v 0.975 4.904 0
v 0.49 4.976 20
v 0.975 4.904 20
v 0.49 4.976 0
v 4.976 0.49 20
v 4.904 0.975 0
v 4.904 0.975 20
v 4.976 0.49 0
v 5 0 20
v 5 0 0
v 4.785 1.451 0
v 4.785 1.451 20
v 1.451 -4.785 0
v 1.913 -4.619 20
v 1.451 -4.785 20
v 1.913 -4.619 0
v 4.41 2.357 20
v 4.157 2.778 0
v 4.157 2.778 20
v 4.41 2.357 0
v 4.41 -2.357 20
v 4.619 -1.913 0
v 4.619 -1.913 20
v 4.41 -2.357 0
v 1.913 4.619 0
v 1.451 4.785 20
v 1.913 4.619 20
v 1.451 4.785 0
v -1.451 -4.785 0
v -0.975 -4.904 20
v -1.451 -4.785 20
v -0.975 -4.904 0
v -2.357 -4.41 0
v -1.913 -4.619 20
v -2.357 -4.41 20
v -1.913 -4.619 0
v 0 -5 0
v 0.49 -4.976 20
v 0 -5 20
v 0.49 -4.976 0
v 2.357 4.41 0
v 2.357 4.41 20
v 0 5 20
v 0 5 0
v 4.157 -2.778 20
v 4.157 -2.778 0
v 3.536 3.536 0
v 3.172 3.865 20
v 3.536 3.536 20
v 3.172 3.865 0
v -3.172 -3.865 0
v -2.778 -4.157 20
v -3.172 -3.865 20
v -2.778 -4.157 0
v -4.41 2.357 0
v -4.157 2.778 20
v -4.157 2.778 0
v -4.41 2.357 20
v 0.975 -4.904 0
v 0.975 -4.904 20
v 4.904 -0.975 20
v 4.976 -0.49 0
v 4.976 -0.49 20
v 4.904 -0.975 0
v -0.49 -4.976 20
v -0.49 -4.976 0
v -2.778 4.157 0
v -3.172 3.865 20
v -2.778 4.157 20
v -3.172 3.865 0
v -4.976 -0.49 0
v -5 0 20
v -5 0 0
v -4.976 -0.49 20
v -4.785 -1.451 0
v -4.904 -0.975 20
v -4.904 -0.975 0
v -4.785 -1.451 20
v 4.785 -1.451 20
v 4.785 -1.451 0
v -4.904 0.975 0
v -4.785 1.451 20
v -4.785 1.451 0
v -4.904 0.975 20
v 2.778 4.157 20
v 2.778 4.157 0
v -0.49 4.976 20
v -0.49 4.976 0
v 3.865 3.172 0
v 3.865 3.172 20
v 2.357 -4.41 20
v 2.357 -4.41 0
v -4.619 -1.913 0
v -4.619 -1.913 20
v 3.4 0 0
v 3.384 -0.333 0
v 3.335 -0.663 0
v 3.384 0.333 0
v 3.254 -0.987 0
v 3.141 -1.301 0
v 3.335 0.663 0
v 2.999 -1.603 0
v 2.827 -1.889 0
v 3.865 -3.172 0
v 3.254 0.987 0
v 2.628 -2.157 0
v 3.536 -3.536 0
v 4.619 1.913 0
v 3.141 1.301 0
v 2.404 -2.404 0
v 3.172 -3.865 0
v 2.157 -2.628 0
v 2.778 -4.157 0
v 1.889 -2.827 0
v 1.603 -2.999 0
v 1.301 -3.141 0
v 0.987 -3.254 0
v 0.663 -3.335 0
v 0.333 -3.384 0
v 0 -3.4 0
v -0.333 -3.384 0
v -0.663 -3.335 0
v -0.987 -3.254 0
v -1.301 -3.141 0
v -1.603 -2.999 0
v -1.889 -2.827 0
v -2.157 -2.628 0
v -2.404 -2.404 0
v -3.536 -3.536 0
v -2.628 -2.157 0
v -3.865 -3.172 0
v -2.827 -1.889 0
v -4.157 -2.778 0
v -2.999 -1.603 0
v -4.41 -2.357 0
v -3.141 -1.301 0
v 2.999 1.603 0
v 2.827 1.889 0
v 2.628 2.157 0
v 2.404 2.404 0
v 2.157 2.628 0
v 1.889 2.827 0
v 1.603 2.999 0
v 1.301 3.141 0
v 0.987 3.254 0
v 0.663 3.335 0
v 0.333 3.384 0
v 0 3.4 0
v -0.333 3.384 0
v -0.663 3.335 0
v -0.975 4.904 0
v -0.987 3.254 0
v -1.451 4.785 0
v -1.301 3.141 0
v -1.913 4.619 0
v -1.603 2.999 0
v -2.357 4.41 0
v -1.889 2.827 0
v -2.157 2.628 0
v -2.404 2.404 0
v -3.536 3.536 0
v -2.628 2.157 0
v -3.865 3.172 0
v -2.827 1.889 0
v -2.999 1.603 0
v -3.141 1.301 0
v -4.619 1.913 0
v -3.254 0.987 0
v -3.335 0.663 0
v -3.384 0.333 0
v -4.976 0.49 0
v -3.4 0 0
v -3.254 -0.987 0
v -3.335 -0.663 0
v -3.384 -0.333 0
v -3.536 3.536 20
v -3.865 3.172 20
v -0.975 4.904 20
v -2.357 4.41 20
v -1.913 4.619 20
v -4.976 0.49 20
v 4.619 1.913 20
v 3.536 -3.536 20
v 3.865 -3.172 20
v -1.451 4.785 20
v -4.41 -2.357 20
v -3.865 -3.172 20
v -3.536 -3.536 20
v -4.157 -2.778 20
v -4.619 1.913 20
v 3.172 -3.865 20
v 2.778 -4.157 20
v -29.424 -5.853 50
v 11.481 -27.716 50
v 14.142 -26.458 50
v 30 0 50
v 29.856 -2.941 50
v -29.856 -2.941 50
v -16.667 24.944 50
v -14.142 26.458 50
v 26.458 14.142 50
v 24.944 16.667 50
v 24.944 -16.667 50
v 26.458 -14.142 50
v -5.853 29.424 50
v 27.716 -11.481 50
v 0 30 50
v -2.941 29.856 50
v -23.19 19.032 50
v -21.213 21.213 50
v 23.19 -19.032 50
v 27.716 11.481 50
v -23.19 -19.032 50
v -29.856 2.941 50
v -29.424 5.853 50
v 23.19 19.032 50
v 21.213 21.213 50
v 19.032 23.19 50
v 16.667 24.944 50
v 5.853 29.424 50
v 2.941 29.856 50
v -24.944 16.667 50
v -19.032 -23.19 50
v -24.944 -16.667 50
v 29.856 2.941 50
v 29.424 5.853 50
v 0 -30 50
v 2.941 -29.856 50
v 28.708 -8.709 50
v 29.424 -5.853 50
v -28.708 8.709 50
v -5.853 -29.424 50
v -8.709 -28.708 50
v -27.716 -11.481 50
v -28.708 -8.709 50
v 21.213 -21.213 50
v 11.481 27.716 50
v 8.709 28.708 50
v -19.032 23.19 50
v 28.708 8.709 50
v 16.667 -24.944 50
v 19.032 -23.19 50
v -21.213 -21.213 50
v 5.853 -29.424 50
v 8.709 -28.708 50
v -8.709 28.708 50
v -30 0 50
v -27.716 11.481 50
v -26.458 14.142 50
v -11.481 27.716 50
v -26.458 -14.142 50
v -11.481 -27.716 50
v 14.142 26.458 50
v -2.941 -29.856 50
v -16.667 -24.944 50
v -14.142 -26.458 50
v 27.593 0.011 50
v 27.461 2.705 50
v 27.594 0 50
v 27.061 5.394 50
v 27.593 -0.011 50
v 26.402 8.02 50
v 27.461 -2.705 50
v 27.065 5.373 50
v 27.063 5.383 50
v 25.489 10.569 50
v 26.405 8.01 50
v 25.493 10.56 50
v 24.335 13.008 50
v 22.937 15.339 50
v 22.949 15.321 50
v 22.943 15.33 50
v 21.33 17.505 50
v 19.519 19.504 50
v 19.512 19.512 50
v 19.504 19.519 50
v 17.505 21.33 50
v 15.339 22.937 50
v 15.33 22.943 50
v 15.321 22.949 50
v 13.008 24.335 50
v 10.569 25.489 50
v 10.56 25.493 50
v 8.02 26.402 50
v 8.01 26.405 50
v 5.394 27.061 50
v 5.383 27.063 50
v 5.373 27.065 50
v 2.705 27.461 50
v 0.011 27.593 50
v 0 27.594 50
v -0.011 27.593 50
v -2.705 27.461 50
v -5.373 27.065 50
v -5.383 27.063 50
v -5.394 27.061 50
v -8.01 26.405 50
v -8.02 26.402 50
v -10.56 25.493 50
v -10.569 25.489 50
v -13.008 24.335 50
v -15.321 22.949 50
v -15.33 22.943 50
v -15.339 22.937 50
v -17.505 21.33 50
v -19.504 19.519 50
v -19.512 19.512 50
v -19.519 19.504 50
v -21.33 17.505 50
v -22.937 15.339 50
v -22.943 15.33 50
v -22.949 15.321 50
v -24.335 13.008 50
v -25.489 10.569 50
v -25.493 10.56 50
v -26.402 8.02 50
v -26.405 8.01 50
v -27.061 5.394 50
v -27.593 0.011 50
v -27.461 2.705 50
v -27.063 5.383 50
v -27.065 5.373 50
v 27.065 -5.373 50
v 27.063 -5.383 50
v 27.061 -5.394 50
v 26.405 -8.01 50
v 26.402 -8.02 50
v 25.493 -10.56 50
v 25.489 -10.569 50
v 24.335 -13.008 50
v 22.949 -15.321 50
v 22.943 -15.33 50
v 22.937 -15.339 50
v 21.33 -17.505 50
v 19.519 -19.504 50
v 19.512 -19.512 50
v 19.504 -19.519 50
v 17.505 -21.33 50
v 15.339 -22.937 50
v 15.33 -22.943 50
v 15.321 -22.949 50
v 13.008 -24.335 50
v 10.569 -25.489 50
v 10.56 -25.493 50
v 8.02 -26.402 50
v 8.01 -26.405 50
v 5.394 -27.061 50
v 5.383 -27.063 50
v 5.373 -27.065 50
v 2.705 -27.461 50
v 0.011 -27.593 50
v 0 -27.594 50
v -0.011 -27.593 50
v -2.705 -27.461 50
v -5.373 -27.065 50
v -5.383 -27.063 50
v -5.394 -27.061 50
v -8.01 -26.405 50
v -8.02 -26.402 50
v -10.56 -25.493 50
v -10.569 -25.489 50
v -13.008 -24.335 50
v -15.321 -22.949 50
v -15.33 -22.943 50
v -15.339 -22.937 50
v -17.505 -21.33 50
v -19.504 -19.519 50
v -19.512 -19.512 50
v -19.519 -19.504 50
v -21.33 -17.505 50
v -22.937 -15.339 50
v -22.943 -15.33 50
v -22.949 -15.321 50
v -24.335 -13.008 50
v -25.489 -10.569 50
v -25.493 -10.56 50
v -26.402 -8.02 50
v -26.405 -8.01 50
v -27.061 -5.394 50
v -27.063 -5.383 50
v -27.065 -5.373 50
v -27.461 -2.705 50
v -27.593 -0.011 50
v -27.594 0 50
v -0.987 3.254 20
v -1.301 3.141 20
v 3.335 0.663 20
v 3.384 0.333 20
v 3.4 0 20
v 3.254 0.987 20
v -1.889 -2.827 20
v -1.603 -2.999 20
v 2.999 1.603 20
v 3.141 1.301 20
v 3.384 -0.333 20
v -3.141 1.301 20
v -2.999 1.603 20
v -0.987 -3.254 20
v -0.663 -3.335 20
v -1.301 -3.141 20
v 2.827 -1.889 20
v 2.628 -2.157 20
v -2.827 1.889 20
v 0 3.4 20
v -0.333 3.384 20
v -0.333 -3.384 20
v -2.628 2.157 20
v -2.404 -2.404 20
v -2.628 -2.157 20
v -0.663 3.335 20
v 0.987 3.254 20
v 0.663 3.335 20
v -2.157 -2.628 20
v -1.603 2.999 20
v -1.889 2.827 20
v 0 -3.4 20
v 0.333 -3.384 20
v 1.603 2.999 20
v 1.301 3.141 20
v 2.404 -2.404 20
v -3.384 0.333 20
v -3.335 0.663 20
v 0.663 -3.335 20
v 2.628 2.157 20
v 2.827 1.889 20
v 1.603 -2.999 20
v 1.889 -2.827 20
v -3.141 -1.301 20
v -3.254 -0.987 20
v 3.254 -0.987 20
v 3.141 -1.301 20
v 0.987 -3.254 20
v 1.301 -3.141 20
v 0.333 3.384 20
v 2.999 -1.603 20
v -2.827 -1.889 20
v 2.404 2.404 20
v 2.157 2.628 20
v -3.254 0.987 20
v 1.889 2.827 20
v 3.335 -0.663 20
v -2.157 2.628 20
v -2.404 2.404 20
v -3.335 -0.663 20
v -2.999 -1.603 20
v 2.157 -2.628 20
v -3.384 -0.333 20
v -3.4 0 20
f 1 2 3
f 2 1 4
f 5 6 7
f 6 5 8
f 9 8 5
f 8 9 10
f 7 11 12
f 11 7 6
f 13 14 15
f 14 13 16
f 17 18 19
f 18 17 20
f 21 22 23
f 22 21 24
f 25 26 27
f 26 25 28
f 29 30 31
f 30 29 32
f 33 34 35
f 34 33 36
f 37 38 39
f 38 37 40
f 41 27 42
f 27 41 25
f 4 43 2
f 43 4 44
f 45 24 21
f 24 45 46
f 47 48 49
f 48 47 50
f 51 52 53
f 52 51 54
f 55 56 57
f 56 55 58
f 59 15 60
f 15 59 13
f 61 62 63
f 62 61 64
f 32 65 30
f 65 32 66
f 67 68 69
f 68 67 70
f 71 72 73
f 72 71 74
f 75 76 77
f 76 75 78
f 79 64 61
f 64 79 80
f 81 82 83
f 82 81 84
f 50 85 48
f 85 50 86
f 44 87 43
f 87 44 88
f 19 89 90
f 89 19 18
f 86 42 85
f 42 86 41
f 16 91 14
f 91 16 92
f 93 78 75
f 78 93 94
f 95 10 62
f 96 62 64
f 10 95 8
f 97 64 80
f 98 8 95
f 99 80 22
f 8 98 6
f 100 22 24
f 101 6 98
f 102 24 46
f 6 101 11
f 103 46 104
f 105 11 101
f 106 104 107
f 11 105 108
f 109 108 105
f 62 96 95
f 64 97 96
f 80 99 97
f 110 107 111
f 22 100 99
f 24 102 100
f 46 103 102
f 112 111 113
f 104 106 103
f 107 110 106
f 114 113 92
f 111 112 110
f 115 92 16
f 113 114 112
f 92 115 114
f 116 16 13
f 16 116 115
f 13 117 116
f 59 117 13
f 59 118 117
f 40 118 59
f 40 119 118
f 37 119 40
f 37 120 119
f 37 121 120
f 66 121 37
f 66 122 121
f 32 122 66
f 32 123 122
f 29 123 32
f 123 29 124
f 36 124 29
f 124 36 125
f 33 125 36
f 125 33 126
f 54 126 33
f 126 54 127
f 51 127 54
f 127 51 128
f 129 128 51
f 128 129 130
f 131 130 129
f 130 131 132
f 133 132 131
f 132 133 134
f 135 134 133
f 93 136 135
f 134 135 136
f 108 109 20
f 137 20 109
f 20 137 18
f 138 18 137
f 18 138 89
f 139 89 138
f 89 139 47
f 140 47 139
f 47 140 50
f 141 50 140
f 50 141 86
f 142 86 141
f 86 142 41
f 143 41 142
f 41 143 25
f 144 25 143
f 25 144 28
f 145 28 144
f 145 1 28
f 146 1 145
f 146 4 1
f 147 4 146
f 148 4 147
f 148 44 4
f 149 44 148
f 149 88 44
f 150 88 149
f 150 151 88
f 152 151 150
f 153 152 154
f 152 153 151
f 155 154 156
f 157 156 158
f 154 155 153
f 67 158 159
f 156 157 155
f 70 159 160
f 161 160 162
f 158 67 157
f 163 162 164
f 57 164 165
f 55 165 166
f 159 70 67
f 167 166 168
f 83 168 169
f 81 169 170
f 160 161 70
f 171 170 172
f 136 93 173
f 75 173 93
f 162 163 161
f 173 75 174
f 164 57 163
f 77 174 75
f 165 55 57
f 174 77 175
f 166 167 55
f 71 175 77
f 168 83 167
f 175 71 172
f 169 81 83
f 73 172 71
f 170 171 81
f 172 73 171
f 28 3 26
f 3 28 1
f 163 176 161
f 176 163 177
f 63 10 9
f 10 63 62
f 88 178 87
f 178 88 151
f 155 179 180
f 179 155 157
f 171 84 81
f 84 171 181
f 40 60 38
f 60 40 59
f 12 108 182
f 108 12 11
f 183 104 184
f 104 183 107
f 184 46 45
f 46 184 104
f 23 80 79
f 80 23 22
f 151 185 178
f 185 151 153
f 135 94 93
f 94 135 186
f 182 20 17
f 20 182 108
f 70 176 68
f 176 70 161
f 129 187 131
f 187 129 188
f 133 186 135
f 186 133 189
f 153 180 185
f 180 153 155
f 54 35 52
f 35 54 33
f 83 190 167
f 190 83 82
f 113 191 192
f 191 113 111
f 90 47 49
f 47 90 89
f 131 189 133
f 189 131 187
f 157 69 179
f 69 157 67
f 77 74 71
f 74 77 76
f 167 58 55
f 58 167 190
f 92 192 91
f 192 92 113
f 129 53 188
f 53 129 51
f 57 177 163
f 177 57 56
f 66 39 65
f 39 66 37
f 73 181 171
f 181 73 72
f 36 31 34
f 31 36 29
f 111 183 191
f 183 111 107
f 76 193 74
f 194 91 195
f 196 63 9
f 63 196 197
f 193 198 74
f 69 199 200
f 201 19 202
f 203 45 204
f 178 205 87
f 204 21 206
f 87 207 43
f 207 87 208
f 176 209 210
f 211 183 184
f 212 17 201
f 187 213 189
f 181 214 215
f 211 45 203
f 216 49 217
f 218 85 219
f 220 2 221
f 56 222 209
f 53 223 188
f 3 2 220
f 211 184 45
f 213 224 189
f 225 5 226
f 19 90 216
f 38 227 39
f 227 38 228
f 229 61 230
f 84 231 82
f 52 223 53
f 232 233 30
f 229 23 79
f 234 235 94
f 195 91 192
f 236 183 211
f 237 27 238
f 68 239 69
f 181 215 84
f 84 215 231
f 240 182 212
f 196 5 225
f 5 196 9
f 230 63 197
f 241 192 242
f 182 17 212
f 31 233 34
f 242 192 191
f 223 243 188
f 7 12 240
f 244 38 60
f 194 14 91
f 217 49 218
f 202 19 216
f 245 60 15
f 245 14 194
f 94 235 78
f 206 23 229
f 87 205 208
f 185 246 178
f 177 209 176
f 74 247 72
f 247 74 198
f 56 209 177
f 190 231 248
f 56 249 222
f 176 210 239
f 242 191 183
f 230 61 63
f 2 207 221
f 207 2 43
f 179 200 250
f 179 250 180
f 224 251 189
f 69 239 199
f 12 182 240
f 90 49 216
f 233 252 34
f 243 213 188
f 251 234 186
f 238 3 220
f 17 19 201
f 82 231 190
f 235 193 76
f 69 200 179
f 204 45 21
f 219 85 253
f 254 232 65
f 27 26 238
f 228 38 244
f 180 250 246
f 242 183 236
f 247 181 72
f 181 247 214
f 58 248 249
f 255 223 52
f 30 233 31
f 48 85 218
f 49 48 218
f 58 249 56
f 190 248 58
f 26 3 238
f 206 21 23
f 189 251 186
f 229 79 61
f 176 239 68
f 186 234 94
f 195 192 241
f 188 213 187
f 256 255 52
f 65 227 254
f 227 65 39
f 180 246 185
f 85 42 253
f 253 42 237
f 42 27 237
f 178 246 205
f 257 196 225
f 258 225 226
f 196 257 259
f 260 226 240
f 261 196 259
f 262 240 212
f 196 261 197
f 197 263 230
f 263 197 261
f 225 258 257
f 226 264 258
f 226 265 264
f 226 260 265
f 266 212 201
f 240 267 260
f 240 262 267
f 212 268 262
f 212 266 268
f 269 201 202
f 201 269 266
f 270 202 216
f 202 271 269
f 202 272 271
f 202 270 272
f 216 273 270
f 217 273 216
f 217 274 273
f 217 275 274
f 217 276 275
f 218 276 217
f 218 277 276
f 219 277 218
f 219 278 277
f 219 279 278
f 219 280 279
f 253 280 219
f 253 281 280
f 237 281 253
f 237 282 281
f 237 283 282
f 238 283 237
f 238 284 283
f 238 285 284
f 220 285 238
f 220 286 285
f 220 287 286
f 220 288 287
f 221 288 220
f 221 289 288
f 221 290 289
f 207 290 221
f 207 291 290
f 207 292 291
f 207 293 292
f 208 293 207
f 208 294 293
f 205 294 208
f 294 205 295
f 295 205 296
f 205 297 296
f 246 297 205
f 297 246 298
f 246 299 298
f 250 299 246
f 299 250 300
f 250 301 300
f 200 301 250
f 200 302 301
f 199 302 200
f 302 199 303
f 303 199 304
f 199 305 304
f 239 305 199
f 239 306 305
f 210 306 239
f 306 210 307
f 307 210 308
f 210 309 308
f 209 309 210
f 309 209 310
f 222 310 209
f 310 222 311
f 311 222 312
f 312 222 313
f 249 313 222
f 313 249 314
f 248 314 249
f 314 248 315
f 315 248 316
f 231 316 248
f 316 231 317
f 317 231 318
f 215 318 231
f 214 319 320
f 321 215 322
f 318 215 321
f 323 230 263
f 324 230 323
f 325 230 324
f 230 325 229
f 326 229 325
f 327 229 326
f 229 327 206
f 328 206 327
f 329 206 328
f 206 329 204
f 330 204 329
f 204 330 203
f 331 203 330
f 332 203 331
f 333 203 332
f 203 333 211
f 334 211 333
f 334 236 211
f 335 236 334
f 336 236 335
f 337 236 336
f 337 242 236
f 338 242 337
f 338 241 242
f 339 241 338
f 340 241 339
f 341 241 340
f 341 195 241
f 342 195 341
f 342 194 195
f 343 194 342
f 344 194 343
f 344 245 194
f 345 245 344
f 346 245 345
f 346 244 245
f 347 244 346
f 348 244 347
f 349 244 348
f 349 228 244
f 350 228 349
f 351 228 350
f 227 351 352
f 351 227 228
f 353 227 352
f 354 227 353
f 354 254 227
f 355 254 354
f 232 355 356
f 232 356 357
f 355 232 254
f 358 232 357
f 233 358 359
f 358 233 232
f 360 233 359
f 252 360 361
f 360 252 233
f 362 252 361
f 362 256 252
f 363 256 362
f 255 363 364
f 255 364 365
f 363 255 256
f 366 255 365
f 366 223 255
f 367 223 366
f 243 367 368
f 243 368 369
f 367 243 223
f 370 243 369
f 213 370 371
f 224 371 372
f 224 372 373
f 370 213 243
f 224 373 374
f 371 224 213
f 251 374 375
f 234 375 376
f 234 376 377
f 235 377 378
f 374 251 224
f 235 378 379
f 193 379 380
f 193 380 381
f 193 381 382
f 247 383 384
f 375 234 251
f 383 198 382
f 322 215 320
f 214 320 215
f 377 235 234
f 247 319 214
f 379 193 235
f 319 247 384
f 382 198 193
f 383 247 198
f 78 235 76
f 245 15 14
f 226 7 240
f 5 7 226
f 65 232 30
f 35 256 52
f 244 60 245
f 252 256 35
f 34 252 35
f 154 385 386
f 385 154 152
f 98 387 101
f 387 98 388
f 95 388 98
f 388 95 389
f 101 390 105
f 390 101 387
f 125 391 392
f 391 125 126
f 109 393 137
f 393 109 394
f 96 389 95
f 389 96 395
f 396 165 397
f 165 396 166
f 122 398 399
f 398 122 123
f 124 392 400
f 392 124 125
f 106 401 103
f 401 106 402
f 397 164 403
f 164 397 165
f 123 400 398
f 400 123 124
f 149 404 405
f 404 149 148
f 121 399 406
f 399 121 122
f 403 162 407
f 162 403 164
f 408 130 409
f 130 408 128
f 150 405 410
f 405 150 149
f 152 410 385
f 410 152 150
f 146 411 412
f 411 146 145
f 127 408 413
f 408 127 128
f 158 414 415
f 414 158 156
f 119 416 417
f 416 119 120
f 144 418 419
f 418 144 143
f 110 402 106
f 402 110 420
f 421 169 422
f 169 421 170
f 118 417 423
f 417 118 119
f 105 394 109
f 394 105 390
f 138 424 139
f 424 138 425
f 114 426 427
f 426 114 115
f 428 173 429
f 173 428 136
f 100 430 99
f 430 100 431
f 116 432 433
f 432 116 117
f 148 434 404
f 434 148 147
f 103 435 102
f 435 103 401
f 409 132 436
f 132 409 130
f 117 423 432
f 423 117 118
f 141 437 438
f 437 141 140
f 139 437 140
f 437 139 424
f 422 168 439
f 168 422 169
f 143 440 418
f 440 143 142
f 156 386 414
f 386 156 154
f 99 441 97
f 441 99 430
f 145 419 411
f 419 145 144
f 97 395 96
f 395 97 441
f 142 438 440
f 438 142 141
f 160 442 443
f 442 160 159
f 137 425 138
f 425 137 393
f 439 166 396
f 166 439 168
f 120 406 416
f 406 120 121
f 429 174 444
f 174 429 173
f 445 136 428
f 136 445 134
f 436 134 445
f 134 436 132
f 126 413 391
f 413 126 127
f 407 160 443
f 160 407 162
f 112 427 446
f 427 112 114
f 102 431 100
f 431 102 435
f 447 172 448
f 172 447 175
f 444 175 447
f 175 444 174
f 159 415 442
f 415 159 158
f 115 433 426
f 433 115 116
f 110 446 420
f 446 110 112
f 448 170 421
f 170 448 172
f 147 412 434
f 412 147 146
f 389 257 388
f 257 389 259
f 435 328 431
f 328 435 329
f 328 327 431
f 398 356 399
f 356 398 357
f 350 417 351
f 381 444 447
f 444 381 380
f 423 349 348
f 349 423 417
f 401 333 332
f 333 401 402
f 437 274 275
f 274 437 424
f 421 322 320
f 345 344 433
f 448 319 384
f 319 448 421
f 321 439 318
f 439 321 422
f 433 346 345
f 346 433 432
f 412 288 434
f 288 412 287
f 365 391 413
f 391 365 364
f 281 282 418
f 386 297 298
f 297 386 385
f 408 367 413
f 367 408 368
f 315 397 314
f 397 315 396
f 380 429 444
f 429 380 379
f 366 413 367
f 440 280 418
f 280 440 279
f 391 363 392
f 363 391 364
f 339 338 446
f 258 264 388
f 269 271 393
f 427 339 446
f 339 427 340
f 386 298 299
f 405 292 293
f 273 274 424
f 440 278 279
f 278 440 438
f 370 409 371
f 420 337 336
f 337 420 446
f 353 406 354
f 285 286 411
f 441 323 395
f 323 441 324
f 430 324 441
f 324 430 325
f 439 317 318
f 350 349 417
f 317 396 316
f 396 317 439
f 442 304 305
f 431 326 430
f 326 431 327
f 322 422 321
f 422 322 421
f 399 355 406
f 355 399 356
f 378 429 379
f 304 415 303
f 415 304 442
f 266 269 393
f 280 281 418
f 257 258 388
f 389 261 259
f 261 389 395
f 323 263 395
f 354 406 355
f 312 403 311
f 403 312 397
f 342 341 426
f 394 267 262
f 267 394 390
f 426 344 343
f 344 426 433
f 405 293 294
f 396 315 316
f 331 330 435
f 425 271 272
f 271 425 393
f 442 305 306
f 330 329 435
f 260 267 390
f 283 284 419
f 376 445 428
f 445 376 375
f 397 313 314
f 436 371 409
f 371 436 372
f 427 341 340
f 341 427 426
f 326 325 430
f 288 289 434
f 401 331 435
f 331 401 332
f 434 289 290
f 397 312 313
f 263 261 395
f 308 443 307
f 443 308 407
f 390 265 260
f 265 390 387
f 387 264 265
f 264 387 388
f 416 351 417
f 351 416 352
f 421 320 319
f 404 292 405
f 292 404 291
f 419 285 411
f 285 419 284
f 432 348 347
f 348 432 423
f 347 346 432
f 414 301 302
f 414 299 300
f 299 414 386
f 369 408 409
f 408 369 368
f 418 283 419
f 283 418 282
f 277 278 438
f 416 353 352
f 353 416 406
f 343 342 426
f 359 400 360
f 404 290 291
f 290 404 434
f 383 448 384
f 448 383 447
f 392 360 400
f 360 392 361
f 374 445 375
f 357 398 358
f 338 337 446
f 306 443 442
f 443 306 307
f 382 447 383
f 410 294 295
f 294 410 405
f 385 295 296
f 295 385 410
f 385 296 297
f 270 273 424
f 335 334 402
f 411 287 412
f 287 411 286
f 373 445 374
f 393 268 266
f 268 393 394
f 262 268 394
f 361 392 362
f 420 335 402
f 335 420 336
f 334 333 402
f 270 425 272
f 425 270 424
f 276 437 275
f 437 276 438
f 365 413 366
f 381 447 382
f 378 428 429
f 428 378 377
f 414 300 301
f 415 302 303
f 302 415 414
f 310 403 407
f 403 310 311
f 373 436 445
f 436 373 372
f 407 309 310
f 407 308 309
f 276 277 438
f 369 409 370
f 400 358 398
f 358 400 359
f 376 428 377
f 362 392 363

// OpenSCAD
// Funnel - a straight spout (tube) with a conical bowl, open at both ends, for pouring
// liquids in the lab. NOVEL general part.
//

spout_d = 10;
spout_l = 20;
cone_d1 = 10;
cone_d2 = 60;
cone_h  = 30;
wall    = 1.6;

$fn = 64;

ib = spout_d - 2 * wall;   // bore of the spout

difference() {
    union() {
        cylinder(h = spout_l, d = spout_d);          // spout
        translate([0, 0, spout_l]) cylinder(h = cone_h, d1 = spout_d, d2 = cone_d2);  // bowl
    }
    translate([0, 0, -1]) cylinder(h = spout_l + 2, d = ib);   // bore through spout
    translate([0, 0, spout_l]) cylinder(h = cone_h + 1, d1 = ib, d2 = cone_d2 - 2 * wall);     // empty space in the bowl
}
